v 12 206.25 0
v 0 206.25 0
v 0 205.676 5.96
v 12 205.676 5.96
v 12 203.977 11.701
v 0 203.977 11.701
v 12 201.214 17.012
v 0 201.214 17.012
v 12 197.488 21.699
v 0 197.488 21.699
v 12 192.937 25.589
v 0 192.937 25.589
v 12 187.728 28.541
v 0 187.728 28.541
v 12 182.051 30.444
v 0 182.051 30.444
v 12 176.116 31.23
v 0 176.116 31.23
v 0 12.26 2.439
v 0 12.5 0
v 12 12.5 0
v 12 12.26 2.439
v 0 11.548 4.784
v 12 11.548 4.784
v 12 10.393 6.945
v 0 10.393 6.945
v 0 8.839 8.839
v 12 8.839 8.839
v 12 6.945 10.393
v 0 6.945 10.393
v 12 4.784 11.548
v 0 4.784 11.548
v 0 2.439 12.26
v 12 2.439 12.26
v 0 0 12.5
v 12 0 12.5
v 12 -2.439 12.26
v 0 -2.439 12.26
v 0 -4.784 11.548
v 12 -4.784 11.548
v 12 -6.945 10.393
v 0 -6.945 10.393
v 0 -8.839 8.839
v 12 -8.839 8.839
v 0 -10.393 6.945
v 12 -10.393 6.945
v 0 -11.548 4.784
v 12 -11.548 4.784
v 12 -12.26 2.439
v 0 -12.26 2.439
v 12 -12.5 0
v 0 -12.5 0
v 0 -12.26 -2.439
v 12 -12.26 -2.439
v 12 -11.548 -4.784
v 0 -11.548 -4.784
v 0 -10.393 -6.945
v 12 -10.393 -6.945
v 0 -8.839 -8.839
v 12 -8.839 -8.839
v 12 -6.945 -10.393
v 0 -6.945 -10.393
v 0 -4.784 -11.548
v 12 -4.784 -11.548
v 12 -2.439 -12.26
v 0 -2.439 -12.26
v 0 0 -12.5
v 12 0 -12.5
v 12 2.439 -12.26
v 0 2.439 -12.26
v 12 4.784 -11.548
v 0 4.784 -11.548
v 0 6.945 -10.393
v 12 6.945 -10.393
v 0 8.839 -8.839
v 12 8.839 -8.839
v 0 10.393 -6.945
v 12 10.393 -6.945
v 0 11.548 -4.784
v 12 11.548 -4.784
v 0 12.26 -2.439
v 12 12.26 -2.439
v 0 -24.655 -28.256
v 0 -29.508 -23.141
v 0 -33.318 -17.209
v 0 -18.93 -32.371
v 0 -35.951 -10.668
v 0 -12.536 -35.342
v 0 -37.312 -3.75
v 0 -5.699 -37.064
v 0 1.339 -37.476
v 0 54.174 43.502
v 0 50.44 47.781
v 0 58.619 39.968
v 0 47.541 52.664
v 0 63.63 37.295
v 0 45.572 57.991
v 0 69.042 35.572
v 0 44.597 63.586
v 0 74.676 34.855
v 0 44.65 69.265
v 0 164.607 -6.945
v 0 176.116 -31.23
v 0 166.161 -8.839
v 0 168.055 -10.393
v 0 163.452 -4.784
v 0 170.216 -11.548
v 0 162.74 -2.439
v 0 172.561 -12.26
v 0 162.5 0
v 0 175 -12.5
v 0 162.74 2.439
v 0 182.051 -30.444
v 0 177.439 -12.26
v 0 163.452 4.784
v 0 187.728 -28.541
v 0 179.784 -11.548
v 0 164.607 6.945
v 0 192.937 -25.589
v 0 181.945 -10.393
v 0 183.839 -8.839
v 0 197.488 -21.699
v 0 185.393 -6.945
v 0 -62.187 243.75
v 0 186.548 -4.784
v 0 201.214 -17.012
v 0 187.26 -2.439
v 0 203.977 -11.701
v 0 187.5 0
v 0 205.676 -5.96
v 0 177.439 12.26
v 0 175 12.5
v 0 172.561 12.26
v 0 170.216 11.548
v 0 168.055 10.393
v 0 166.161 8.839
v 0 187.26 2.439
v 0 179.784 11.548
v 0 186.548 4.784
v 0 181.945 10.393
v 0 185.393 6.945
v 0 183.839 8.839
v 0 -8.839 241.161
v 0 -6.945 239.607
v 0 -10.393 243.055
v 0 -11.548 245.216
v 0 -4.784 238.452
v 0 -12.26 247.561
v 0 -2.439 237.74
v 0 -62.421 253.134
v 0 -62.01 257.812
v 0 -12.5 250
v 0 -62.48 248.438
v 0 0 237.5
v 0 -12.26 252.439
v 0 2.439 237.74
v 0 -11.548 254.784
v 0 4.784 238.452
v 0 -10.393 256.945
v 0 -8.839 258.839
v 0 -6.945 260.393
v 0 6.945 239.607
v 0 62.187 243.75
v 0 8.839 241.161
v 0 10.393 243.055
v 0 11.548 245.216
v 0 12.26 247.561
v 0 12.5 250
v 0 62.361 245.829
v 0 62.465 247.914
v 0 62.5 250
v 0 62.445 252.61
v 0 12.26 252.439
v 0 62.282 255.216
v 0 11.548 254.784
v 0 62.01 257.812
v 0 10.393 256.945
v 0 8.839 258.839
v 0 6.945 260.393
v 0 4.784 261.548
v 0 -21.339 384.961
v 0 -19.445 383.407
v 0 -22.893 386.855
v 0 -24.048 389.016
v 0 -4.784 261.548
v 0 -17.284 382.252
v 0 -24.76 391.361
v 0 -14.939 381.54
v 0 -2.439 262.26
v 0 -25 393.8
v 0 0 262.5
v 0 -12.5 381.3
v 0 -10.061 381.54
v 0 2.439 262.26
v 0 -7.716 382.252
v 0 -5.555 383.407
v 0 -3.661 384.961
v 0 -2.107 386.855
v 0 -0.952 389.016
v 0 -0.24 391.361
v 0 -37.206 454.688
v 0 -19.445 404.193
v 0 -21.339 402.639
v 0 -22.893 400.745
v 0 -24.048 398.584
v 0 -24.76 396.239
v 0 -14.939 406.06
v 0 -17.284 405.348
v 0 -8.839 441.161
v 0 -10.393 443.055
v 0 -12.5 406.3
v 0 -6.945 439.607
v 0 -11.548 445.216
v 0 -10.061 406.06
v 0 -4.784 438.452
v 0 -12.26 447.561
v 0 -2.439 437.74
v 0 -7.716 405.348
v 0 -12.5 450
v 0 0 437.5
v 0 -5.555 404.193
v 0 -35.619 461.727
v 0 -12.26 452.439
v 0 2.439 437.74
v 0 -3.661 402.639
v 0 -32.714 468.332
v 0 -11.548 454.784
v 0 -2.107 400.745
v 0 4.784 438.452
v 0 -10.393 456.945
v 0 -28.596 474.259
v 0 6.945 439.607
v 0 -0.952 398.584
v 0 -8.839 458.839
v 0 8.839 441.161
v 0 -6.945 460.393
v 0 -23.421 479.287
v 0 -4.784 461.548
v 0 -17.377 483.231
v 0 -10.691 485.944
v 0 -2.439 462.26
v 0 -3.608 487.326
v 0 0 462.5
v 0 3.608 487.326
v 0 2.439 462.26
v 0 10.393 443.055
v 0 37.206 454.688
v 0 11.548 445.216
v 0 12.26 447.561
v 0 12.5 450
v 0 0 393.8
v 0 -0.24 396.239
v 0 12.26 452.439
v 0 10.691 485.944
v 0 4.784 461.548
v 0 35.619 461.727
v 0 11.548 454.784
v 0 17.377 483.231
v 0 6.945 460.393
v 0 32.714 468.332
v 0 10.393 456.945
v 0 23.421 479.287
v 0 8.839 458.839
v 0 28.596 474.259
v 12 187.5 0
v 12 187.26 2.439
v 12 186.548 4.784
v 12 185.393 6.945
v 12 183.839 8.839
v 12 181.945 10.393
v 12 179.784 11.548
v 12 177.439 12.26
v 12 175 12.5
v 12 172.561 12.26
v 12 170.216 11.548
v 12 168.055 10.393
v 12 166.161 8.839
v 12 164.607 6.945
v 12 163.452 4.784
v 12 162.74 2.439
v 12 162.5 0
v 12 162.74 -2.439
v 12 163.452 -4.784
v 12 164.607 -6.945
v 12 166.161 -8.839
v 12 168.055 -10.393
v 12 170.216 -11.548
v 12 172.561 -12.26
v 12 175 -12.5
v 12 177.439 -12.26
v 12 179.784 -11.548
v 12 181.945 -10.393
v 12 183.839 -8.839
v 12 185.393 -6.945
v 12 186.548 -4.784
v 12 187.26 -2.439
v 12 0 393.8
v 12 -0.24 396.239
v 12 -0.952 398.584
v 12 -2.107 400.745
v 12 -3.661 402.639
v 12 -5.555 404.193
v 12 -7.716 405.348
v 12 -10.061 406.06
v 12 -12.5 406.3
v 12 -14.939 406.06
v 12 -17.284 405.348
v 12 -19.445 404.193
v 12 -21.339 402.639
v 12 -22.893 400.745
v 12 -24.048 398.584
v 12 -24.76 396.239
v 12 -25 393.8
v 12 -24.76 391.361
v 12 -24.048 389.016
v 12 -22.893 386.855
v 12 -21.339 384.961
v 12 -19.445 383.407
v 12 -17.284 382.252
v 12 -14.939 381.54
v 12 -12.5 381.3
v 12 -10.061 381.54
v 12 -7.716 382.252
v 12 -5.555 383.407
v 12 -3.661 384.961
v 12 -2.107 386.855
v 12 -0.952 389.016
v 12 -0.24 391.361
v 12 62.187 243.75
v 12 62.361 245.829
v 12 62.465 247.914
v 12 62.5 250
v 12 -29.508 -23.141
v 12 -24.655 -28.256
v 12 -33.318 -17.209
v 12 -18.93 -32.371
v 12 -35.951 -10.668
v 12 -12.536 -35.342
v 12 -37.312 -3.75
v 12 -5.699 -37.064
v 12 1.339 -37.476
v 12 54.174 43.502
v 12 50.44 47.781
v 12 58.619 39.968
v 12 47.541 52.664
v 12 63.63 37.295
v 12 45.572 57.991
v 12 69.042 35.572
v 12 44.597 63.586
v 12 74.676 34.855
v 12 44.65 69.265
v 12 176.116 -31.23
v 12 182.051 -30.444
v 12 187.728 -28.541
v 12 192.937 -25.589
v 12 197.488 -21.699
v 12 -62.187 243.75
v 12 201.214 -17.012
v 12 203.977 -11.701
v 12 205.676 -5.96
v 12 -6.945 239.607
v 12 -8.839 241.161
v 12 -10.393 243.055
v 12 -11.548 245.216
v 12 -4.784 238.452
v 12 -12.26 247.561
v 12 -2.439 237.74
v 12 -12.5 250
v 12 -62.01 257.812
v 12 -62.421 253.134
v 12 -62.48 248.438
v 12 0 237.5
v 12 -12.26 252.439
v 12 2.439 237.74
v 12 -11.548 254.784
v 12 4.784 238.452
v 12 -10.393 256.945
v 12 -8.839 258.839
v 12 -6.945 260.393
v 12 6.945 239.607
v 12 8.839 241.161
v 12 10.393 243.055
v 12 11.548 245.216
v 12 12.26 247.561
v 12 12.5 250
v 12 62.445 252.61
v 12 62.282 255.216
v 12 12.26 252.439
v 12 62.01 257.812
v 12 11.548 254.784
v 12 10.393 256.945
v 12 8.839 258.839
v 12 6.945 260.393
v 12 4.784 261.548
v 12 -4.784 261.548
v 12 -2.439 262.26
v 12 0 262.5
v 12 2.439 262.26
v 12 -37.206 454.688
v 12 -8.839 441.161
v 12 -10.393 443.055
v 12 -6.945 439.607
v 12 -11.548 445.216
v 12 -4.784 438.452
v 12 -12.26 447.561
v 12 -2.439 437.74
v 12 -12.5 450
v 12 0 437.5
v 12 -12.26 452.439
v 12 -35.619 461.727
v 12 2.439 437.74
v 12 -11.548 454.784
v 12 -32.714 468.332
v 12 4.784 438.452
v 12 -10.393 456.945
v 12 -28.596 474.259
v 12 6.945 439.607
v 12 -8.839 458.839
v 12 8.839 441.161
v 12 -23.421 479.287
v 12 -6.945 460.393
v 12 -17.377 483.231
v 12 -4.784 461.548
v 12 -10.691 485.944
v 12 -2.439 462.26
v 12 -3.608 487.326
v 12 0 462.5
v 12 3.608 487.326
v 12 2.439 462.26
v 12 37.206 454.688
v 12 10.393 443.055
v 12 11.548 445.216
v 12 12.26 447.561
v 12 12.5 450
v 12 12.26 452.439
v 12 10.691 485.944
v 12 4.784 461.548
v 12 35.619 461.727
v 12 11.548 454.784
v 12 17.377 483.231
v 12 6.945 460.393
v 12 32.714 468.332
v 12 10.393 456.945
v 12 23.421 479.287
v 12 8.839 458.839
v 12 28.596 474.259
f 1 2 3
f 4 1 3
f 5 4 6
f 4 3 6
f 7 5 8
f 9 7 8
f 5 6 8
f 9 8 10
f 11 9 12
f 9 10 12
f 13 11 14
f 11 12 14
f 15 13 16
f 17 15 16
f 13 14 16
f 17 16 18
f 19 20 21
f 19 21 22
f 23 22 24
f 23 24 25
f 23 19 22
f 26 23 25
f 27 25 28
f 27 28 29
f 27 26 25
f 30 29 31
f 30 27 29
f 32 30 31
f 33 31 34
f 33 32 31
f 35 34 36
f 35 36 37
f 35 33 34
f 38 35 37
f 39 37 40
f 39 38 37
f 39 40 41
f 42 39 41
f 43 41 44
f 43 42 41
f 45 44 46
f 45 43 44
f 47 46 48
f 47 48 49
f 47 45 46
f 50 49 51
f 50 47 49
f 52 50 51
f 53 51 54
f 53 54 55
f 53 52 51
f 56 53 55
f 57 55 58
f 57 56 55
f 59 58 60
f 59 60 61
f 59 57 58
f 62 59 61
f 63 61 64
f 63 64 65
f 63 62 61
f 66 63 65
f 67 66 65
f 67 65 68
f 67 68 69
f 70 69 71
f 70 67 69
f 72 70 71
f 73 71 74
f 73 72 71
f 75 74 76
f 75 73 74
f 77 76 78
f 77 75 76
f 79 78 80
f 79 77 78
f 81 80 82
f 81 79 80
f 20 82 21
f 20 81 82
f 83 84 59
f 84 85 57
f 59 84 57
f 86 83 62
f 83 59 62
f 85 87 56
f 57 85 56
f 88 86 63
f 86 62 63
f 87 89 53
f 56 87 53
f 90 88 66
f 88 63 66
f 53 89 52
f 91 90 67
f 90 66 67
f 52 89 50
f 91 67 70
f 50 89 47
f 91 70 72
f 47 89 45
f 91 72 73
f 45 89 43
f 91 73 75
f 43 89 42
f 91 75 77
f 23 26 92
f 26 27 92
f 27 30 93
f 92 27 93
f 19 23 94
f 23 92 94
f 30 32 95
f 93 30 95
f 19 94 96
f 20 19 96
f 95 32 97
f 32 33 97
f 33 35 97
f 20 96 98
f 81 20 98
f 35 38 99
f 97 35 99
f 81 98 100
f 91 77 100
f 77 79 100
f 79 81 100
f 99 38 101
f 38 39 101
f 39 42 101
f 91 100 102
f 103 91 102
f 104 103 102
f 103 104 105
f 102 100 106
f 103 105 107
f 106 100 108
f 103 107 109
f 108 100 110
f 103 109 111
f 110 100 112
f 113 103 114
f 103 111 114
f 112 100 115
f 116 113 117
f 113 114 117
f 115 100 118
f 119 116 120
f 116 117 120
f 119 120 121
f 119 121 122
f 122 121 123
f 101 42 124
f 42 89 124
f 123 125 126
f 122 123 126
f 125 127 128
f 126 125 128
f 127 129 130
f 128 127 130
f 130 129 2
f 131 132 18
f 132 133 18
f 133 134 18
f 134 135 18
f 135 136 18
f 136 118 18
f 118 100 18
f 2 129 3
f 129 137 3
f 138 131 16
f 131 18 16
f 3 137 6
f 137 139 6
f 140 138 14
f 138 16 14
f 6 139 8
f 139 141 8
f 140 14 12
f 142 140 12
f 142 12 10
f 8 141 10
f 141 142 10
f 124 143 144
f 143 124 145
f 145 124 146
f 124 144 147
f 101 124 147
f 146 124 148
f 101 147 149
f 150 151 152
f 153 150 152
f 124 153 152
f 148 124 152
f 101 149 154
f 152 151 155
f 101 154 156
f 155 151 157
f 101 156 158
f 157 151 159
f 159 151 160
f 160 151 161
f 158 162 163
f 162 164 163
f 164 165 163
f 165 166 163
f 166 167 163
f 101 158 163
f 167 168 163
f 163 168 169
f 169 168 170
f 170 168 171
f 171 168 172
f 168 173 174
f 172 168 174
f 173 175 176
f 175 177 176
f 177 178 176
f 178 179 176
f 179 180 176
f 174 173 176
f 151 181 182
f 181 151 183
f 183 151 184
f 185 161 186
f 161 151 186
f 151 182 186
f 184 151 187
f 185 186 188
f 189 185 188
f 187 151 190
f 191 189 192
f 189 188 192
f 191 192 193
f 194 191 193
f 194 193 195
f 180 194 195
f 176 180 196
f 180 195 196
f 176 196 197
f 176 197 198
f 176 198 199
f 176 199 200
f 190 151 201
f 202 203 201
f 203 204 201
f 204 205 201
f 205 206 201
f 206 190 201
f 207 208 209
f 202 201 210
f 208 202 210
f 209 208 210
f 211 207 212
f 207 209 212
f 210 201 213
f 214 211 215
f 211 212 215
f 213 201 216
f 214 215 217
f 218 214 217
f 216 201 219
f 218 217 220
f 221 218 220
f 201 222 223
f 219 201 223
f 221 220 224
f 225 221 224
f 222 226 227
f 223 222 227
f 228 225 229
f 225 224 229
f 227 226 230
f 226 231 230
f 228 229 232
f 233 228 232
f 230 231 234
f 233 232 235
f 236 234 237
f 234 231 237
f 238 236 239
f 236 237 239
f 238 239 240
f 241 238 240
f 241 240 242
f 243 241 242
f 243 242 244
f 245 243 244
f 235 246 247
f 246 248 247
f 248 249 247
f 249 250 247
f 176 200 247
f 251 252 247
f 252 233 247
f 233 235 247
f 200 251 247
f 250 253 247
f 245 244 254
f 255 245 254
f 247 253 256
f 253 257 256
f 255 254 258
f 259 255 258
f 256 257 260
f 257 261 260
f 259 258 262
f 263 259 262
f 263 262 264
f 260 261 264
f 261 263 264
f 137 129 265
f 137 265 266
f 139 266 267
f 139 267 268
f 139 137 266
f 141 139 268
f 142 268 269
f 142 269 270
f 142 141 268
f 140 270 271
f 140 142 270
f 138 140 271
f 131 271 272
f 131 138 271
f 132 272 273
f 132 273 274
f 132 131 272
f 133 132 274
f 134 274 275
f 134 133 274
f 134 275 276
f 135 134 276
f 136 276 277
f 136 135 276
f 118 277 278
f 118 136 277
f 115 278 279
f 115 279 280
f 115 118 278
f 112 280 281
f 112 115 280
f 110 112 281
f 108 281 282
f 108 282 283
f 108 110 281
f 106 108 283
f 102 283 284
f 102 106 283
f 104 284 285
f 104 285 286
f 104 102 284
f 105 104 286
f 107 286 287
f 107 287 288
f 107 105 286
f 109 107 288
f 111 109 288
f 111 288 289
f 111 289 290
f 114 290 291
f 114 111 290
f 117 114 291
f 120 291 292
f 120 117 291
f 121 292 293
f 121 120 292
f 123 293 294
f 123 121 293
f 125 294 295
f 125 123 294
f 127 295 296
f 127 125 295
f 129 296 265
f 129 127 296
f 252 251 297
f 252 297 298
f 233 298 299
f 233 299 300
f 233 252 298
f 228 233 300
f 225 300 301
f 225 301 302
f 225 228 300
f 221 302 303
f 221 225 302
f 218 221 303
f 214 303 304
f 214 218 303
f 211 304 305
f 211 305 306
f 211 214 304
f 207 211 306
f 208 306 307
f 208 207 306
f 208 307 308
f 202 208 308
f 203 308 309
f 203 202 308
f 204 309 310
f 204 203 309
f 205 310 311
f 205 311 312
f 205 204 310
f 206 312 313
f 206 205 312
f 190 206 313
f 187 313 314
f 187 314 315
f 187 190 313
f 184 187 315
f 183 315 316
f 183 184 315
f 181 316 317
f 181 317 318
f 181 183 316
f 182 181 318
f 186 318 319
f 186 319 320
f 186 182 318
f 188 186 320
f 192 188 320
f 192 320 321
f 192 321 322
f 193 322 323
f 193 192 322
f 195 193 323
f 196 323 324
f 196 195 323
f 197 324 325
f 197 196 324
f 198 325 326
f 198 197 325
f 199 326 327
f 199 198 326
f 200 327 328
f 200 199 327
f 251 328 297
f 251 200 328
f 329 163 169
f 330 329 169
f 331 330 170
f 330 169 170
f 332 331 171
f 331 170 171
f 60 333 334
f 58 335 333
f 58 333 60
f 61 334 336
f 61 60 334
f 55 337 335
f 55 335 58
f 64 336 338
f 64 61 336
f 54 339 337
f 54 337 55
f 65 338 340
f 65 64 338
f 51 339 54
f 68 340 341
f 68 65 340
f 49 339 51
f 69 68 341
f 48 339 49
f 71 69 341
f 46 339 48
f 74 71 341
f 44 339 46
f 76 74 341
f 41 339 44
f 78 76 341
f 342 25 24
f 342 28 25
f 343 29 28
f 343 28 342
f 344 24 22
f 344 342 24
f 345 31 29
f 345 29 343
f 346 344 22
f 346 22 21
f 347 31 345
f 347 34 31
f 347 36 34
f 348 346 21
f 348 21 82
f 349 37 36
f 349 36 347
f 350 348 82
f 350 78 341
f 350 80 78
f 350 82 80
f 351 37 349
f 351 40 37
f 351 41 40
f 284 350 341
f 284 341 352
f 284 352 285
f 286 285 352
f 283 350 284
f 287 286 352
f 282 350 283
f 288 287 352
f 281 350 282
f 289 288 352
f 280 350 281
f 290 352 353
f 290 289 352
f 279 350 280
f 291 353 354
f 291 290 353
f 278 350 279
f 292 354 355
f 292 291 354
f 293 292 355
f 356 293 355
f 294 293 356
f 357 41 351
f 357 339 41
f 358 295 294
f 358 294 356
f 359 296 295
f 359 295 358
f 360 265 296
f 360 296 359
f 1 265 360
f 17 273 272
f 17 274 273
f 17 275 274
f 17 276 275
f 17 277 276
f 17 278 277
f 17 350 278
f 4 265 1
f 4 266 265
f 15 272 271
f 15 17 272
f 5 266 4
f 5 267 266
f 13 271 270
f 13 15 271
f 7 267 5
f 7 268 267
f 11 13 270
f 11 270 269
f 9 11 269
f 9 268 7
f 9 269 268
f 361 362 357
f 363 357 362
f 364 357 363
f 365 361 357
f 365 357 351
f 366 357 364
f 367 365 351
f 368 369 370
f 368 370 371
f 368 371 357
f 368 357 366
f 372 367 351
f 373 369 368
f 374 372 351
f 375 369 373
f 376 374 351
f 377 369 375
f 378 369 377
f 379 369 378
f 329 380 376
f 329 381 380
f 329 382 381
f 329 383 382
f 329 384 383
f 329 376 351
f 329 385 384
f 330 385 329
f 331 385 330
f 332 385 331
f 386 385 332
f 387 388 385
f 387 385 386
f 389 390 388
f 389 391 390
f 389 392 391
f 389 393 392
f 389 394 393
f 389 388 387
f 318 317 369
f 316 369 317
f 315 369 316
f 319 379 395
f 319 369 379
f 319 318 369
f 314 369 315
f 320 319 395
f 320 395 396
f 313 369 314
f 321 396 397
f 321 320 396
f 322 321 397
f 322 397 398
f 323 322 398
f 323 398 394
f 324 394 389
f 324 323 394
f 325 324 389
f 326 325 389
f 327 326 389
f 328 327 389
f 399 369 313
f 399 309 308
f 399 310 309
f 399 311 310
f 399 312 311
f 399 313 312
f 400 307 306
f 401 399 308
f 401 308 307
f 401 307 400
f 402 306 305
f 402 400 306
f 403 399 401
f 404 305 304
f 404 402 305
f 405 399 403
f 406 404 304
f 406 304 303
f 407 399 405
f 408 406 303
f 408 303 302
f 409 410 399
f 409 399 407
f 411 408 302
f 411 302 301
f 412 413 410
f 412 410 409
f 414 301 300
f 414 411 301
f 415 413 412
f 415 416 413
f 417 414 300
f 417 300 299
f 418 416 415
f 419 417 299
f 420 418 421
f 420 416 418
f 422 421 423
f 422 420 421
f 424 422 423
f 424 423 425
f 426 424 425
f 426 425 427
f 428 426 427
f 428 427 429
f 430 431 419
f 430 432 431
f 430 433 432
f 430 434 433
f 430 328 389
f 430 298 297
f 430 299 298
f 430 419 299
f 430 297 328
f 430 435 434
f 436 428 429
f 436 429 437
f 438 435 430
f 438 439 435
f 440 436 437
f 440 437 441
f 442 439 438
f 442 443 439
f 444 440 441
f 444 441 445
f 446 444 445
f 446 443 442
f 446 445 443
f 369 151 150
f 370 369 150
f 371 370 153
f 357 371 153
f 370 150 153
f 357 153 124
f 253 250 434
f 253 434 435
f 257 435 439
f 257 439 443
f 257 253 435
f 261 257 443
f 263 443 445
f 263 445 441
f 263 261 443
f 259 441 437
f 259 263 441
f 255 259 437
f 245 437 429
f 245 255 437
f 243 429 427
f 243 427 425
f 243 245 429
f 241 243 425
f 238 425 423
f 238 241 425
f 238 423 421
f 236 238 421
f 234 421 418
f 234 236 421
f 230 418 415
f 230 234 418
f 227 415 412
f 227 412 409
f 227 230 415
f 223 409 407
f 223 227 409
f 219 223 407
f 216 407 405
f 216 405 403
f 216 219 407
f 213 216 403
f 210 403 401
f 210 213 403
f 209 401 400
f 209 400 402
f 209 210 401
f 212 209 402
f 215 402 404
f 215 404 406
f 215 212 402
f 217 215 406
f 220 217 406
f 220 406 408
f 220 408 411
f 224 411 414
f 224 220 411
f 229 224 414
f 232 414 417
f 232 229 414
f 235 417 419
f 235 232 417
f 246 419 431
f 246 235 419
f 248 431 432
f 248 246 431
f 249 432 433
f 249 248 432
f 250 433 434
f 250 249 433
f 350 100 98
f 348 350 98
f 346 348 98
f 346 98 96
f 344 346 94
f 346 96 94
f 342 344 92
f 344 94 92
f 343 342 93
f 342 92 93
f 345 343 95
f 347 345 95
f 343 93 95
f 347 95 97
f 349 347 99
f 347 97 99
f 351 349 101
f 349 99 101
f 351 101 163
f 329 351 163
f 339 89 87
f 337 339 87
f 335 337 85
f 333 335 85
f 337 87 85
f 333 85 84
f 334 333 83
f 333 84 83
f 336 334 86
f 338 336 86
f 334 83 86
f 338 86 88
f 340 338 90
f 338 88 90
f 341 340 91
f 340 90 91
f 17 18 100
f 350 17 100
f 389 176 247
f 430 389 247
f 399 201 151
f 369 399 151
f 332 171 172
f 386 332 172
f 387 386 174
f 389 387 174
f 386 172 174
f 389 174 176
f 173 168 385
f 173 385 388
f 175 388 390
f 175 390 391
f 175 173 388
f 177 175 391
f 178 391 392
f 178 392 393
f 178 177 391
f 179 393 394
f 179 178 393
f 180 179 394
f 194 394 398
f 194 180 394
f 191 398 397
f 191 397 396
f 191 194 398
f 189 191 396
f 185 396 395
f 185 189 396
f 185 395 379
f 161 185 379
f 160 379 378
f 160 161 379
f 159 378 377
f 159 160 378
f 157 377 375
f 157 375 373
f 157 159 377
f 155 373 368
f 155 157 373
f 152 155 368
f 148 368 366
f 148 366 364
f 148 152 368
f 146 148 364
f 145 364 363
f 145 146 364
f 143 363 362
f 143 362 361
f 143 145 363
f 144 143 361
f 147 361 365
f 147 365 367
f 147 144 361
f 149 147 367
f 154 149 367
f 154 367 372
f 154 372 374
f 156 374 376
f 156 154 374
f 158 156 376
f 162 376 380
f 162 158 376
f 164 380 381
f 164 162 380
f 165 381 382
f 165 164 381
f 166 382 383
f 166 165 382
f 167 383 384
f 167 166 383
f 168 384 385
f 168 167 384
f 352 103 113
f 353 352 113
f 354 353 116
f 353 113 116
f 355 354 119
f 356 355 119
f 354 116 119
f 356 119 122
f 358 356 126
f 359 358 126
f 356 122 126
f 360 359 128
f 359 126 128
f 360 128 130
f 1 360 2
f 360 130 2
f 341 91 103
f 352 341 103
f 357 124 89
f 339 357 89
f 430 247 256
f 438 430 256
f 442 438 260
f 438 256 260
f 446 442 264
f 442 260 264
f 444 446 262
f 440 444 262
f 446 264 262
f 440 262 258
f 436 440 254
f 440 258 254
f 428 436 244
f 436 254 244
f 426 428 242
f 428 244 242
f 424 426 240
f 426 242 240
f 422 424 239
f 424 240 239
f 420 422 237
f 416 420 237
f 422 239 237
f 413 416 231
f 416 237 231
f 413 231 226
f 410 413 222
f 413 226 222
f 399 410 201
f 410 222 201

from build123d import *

# Parameters (mm, degrees)
F0_R     = 12.5
F1_DEPTH = 12


with BuildPart() as f1:
    # F0 (on Right) → F1 (new body)
    with BuildSketch(Plane.YZ):
        with BuildLine():
            ThreePointArc((-37.205878, 454.6875), (-2.348359, 412.573603), (37.5, 450))
            ThreePointArc((37.5, 450), (37.426397, 452.348359), (37.205878, 454.6875))
            ThreePointArc((37.205878, 454.6875), (0, 487.5), (-37.205878, 454.6875))
        make_face()
        with Locations((0, 450)):
            Circle(F0_R, mode=Mode.SUBTRACT)
        with BuildLine():
            ThreePointArc((37.205878, 454.6875), (37.426397, 452.348359), (37.5, 450))
            ThreePointArc((37.5, 450), (-2.348359, 412.573603), (-37.205878, 454.6875))
            Line((-37.205878, 454.6875), (-62.009796, 257.8125))
            ThreePointArc((-62.009796, 257.8125), (0, 312.5), (62.009796, 257.8125))
            Line((62.009796, 257.8125), (37.205878, 454.6875))
        make_face()
        with Locations((-12.5, 393.8)):
            Circle(F0_R, mode=Mode.SUBTRACT)
        with BuildLine():
            ThreePointArc((62.5, 250), (62.377329, 253.913932), (62.009796, 257.8125))
            ThreePointArc((62.009796, 257.8125), (0, 312.5), (-62.009796, 257.8125))
            ThreePointArc((-62.009796, 257.8125), (-62.495054, 250.786242), (-62.186715, 243.75))
            ThreePointArc((-62.186715, 243.75), (0, 187.5), (62.186715, 243.75))
            ThreePointArc((62.186715, 243.75), (62.42163, 246.871077), (62.5, 250))
        make_face()
        with Locations((0, 250)):
            Circle(F0_R, mode=Mode.SUBTRACT)
        with BuildLine():
            ThreePointArc((62.186715, 243.75), (0, 187.5), (-62.186715, 243.75))
            Line((-62.186715, 243.75), (-37.312029, -3.75))
            ThreePointArc((-37.312029, -3.75), (-1.877354, 37.452978), (37.5, 0))
            ThreePointArc((37.5, 0), (26.985859, -26.03869), (1.339286, -37.476077))
            Line((1.339286, -37.476077), (176.116071, -31.230064))
            ThreePointArc((176.116071, -31.230064), (143.75, 0), (176.116071, 31.230064))
            Line((176.116071, 31.230064), (74.675591, 34.855251))
            ThreePointArc((74.675591, 34.855251), (52.209448, 45.556532), (44.650341, 69.265283))
            Line((44.650341, 69.265283), (62.186715, 243.75))
        make_face()
        with BuildLine():
            ThreePointArc((37.5, 0), (-1.877354, 37.452978), (-37.312029, -3.75))
            ThreePointArc((-37.312029, -3.75), (-24.655053, -28.25559), (1.339286, -37.476077))
            ThreePointArc((1.339286, -37.476077), (26.985859, -26.03869), (37.5, 0))
        make_face()
        Circle(F0_R, mode=Mode.SUBTRACT)
        with BuildLine():
            ThreePointArc((176.116071, 31.230064), (143.75, 0), (176.116071, -31.230064))
            ThreePointArc((176.116071, -31.230064), (197.488216, -21.698909), (206.25, 0))
            ThreePointArc((206.25, 0), (197.488216, 21.698909), (176.116071, 31.230064))
        make_face()
        with Locations((175, 0)):
            Circle(F0_R, mode=Mode.SUBTRACT)
    extrude(amount=F1_DEPTH)


solid = f1.part
